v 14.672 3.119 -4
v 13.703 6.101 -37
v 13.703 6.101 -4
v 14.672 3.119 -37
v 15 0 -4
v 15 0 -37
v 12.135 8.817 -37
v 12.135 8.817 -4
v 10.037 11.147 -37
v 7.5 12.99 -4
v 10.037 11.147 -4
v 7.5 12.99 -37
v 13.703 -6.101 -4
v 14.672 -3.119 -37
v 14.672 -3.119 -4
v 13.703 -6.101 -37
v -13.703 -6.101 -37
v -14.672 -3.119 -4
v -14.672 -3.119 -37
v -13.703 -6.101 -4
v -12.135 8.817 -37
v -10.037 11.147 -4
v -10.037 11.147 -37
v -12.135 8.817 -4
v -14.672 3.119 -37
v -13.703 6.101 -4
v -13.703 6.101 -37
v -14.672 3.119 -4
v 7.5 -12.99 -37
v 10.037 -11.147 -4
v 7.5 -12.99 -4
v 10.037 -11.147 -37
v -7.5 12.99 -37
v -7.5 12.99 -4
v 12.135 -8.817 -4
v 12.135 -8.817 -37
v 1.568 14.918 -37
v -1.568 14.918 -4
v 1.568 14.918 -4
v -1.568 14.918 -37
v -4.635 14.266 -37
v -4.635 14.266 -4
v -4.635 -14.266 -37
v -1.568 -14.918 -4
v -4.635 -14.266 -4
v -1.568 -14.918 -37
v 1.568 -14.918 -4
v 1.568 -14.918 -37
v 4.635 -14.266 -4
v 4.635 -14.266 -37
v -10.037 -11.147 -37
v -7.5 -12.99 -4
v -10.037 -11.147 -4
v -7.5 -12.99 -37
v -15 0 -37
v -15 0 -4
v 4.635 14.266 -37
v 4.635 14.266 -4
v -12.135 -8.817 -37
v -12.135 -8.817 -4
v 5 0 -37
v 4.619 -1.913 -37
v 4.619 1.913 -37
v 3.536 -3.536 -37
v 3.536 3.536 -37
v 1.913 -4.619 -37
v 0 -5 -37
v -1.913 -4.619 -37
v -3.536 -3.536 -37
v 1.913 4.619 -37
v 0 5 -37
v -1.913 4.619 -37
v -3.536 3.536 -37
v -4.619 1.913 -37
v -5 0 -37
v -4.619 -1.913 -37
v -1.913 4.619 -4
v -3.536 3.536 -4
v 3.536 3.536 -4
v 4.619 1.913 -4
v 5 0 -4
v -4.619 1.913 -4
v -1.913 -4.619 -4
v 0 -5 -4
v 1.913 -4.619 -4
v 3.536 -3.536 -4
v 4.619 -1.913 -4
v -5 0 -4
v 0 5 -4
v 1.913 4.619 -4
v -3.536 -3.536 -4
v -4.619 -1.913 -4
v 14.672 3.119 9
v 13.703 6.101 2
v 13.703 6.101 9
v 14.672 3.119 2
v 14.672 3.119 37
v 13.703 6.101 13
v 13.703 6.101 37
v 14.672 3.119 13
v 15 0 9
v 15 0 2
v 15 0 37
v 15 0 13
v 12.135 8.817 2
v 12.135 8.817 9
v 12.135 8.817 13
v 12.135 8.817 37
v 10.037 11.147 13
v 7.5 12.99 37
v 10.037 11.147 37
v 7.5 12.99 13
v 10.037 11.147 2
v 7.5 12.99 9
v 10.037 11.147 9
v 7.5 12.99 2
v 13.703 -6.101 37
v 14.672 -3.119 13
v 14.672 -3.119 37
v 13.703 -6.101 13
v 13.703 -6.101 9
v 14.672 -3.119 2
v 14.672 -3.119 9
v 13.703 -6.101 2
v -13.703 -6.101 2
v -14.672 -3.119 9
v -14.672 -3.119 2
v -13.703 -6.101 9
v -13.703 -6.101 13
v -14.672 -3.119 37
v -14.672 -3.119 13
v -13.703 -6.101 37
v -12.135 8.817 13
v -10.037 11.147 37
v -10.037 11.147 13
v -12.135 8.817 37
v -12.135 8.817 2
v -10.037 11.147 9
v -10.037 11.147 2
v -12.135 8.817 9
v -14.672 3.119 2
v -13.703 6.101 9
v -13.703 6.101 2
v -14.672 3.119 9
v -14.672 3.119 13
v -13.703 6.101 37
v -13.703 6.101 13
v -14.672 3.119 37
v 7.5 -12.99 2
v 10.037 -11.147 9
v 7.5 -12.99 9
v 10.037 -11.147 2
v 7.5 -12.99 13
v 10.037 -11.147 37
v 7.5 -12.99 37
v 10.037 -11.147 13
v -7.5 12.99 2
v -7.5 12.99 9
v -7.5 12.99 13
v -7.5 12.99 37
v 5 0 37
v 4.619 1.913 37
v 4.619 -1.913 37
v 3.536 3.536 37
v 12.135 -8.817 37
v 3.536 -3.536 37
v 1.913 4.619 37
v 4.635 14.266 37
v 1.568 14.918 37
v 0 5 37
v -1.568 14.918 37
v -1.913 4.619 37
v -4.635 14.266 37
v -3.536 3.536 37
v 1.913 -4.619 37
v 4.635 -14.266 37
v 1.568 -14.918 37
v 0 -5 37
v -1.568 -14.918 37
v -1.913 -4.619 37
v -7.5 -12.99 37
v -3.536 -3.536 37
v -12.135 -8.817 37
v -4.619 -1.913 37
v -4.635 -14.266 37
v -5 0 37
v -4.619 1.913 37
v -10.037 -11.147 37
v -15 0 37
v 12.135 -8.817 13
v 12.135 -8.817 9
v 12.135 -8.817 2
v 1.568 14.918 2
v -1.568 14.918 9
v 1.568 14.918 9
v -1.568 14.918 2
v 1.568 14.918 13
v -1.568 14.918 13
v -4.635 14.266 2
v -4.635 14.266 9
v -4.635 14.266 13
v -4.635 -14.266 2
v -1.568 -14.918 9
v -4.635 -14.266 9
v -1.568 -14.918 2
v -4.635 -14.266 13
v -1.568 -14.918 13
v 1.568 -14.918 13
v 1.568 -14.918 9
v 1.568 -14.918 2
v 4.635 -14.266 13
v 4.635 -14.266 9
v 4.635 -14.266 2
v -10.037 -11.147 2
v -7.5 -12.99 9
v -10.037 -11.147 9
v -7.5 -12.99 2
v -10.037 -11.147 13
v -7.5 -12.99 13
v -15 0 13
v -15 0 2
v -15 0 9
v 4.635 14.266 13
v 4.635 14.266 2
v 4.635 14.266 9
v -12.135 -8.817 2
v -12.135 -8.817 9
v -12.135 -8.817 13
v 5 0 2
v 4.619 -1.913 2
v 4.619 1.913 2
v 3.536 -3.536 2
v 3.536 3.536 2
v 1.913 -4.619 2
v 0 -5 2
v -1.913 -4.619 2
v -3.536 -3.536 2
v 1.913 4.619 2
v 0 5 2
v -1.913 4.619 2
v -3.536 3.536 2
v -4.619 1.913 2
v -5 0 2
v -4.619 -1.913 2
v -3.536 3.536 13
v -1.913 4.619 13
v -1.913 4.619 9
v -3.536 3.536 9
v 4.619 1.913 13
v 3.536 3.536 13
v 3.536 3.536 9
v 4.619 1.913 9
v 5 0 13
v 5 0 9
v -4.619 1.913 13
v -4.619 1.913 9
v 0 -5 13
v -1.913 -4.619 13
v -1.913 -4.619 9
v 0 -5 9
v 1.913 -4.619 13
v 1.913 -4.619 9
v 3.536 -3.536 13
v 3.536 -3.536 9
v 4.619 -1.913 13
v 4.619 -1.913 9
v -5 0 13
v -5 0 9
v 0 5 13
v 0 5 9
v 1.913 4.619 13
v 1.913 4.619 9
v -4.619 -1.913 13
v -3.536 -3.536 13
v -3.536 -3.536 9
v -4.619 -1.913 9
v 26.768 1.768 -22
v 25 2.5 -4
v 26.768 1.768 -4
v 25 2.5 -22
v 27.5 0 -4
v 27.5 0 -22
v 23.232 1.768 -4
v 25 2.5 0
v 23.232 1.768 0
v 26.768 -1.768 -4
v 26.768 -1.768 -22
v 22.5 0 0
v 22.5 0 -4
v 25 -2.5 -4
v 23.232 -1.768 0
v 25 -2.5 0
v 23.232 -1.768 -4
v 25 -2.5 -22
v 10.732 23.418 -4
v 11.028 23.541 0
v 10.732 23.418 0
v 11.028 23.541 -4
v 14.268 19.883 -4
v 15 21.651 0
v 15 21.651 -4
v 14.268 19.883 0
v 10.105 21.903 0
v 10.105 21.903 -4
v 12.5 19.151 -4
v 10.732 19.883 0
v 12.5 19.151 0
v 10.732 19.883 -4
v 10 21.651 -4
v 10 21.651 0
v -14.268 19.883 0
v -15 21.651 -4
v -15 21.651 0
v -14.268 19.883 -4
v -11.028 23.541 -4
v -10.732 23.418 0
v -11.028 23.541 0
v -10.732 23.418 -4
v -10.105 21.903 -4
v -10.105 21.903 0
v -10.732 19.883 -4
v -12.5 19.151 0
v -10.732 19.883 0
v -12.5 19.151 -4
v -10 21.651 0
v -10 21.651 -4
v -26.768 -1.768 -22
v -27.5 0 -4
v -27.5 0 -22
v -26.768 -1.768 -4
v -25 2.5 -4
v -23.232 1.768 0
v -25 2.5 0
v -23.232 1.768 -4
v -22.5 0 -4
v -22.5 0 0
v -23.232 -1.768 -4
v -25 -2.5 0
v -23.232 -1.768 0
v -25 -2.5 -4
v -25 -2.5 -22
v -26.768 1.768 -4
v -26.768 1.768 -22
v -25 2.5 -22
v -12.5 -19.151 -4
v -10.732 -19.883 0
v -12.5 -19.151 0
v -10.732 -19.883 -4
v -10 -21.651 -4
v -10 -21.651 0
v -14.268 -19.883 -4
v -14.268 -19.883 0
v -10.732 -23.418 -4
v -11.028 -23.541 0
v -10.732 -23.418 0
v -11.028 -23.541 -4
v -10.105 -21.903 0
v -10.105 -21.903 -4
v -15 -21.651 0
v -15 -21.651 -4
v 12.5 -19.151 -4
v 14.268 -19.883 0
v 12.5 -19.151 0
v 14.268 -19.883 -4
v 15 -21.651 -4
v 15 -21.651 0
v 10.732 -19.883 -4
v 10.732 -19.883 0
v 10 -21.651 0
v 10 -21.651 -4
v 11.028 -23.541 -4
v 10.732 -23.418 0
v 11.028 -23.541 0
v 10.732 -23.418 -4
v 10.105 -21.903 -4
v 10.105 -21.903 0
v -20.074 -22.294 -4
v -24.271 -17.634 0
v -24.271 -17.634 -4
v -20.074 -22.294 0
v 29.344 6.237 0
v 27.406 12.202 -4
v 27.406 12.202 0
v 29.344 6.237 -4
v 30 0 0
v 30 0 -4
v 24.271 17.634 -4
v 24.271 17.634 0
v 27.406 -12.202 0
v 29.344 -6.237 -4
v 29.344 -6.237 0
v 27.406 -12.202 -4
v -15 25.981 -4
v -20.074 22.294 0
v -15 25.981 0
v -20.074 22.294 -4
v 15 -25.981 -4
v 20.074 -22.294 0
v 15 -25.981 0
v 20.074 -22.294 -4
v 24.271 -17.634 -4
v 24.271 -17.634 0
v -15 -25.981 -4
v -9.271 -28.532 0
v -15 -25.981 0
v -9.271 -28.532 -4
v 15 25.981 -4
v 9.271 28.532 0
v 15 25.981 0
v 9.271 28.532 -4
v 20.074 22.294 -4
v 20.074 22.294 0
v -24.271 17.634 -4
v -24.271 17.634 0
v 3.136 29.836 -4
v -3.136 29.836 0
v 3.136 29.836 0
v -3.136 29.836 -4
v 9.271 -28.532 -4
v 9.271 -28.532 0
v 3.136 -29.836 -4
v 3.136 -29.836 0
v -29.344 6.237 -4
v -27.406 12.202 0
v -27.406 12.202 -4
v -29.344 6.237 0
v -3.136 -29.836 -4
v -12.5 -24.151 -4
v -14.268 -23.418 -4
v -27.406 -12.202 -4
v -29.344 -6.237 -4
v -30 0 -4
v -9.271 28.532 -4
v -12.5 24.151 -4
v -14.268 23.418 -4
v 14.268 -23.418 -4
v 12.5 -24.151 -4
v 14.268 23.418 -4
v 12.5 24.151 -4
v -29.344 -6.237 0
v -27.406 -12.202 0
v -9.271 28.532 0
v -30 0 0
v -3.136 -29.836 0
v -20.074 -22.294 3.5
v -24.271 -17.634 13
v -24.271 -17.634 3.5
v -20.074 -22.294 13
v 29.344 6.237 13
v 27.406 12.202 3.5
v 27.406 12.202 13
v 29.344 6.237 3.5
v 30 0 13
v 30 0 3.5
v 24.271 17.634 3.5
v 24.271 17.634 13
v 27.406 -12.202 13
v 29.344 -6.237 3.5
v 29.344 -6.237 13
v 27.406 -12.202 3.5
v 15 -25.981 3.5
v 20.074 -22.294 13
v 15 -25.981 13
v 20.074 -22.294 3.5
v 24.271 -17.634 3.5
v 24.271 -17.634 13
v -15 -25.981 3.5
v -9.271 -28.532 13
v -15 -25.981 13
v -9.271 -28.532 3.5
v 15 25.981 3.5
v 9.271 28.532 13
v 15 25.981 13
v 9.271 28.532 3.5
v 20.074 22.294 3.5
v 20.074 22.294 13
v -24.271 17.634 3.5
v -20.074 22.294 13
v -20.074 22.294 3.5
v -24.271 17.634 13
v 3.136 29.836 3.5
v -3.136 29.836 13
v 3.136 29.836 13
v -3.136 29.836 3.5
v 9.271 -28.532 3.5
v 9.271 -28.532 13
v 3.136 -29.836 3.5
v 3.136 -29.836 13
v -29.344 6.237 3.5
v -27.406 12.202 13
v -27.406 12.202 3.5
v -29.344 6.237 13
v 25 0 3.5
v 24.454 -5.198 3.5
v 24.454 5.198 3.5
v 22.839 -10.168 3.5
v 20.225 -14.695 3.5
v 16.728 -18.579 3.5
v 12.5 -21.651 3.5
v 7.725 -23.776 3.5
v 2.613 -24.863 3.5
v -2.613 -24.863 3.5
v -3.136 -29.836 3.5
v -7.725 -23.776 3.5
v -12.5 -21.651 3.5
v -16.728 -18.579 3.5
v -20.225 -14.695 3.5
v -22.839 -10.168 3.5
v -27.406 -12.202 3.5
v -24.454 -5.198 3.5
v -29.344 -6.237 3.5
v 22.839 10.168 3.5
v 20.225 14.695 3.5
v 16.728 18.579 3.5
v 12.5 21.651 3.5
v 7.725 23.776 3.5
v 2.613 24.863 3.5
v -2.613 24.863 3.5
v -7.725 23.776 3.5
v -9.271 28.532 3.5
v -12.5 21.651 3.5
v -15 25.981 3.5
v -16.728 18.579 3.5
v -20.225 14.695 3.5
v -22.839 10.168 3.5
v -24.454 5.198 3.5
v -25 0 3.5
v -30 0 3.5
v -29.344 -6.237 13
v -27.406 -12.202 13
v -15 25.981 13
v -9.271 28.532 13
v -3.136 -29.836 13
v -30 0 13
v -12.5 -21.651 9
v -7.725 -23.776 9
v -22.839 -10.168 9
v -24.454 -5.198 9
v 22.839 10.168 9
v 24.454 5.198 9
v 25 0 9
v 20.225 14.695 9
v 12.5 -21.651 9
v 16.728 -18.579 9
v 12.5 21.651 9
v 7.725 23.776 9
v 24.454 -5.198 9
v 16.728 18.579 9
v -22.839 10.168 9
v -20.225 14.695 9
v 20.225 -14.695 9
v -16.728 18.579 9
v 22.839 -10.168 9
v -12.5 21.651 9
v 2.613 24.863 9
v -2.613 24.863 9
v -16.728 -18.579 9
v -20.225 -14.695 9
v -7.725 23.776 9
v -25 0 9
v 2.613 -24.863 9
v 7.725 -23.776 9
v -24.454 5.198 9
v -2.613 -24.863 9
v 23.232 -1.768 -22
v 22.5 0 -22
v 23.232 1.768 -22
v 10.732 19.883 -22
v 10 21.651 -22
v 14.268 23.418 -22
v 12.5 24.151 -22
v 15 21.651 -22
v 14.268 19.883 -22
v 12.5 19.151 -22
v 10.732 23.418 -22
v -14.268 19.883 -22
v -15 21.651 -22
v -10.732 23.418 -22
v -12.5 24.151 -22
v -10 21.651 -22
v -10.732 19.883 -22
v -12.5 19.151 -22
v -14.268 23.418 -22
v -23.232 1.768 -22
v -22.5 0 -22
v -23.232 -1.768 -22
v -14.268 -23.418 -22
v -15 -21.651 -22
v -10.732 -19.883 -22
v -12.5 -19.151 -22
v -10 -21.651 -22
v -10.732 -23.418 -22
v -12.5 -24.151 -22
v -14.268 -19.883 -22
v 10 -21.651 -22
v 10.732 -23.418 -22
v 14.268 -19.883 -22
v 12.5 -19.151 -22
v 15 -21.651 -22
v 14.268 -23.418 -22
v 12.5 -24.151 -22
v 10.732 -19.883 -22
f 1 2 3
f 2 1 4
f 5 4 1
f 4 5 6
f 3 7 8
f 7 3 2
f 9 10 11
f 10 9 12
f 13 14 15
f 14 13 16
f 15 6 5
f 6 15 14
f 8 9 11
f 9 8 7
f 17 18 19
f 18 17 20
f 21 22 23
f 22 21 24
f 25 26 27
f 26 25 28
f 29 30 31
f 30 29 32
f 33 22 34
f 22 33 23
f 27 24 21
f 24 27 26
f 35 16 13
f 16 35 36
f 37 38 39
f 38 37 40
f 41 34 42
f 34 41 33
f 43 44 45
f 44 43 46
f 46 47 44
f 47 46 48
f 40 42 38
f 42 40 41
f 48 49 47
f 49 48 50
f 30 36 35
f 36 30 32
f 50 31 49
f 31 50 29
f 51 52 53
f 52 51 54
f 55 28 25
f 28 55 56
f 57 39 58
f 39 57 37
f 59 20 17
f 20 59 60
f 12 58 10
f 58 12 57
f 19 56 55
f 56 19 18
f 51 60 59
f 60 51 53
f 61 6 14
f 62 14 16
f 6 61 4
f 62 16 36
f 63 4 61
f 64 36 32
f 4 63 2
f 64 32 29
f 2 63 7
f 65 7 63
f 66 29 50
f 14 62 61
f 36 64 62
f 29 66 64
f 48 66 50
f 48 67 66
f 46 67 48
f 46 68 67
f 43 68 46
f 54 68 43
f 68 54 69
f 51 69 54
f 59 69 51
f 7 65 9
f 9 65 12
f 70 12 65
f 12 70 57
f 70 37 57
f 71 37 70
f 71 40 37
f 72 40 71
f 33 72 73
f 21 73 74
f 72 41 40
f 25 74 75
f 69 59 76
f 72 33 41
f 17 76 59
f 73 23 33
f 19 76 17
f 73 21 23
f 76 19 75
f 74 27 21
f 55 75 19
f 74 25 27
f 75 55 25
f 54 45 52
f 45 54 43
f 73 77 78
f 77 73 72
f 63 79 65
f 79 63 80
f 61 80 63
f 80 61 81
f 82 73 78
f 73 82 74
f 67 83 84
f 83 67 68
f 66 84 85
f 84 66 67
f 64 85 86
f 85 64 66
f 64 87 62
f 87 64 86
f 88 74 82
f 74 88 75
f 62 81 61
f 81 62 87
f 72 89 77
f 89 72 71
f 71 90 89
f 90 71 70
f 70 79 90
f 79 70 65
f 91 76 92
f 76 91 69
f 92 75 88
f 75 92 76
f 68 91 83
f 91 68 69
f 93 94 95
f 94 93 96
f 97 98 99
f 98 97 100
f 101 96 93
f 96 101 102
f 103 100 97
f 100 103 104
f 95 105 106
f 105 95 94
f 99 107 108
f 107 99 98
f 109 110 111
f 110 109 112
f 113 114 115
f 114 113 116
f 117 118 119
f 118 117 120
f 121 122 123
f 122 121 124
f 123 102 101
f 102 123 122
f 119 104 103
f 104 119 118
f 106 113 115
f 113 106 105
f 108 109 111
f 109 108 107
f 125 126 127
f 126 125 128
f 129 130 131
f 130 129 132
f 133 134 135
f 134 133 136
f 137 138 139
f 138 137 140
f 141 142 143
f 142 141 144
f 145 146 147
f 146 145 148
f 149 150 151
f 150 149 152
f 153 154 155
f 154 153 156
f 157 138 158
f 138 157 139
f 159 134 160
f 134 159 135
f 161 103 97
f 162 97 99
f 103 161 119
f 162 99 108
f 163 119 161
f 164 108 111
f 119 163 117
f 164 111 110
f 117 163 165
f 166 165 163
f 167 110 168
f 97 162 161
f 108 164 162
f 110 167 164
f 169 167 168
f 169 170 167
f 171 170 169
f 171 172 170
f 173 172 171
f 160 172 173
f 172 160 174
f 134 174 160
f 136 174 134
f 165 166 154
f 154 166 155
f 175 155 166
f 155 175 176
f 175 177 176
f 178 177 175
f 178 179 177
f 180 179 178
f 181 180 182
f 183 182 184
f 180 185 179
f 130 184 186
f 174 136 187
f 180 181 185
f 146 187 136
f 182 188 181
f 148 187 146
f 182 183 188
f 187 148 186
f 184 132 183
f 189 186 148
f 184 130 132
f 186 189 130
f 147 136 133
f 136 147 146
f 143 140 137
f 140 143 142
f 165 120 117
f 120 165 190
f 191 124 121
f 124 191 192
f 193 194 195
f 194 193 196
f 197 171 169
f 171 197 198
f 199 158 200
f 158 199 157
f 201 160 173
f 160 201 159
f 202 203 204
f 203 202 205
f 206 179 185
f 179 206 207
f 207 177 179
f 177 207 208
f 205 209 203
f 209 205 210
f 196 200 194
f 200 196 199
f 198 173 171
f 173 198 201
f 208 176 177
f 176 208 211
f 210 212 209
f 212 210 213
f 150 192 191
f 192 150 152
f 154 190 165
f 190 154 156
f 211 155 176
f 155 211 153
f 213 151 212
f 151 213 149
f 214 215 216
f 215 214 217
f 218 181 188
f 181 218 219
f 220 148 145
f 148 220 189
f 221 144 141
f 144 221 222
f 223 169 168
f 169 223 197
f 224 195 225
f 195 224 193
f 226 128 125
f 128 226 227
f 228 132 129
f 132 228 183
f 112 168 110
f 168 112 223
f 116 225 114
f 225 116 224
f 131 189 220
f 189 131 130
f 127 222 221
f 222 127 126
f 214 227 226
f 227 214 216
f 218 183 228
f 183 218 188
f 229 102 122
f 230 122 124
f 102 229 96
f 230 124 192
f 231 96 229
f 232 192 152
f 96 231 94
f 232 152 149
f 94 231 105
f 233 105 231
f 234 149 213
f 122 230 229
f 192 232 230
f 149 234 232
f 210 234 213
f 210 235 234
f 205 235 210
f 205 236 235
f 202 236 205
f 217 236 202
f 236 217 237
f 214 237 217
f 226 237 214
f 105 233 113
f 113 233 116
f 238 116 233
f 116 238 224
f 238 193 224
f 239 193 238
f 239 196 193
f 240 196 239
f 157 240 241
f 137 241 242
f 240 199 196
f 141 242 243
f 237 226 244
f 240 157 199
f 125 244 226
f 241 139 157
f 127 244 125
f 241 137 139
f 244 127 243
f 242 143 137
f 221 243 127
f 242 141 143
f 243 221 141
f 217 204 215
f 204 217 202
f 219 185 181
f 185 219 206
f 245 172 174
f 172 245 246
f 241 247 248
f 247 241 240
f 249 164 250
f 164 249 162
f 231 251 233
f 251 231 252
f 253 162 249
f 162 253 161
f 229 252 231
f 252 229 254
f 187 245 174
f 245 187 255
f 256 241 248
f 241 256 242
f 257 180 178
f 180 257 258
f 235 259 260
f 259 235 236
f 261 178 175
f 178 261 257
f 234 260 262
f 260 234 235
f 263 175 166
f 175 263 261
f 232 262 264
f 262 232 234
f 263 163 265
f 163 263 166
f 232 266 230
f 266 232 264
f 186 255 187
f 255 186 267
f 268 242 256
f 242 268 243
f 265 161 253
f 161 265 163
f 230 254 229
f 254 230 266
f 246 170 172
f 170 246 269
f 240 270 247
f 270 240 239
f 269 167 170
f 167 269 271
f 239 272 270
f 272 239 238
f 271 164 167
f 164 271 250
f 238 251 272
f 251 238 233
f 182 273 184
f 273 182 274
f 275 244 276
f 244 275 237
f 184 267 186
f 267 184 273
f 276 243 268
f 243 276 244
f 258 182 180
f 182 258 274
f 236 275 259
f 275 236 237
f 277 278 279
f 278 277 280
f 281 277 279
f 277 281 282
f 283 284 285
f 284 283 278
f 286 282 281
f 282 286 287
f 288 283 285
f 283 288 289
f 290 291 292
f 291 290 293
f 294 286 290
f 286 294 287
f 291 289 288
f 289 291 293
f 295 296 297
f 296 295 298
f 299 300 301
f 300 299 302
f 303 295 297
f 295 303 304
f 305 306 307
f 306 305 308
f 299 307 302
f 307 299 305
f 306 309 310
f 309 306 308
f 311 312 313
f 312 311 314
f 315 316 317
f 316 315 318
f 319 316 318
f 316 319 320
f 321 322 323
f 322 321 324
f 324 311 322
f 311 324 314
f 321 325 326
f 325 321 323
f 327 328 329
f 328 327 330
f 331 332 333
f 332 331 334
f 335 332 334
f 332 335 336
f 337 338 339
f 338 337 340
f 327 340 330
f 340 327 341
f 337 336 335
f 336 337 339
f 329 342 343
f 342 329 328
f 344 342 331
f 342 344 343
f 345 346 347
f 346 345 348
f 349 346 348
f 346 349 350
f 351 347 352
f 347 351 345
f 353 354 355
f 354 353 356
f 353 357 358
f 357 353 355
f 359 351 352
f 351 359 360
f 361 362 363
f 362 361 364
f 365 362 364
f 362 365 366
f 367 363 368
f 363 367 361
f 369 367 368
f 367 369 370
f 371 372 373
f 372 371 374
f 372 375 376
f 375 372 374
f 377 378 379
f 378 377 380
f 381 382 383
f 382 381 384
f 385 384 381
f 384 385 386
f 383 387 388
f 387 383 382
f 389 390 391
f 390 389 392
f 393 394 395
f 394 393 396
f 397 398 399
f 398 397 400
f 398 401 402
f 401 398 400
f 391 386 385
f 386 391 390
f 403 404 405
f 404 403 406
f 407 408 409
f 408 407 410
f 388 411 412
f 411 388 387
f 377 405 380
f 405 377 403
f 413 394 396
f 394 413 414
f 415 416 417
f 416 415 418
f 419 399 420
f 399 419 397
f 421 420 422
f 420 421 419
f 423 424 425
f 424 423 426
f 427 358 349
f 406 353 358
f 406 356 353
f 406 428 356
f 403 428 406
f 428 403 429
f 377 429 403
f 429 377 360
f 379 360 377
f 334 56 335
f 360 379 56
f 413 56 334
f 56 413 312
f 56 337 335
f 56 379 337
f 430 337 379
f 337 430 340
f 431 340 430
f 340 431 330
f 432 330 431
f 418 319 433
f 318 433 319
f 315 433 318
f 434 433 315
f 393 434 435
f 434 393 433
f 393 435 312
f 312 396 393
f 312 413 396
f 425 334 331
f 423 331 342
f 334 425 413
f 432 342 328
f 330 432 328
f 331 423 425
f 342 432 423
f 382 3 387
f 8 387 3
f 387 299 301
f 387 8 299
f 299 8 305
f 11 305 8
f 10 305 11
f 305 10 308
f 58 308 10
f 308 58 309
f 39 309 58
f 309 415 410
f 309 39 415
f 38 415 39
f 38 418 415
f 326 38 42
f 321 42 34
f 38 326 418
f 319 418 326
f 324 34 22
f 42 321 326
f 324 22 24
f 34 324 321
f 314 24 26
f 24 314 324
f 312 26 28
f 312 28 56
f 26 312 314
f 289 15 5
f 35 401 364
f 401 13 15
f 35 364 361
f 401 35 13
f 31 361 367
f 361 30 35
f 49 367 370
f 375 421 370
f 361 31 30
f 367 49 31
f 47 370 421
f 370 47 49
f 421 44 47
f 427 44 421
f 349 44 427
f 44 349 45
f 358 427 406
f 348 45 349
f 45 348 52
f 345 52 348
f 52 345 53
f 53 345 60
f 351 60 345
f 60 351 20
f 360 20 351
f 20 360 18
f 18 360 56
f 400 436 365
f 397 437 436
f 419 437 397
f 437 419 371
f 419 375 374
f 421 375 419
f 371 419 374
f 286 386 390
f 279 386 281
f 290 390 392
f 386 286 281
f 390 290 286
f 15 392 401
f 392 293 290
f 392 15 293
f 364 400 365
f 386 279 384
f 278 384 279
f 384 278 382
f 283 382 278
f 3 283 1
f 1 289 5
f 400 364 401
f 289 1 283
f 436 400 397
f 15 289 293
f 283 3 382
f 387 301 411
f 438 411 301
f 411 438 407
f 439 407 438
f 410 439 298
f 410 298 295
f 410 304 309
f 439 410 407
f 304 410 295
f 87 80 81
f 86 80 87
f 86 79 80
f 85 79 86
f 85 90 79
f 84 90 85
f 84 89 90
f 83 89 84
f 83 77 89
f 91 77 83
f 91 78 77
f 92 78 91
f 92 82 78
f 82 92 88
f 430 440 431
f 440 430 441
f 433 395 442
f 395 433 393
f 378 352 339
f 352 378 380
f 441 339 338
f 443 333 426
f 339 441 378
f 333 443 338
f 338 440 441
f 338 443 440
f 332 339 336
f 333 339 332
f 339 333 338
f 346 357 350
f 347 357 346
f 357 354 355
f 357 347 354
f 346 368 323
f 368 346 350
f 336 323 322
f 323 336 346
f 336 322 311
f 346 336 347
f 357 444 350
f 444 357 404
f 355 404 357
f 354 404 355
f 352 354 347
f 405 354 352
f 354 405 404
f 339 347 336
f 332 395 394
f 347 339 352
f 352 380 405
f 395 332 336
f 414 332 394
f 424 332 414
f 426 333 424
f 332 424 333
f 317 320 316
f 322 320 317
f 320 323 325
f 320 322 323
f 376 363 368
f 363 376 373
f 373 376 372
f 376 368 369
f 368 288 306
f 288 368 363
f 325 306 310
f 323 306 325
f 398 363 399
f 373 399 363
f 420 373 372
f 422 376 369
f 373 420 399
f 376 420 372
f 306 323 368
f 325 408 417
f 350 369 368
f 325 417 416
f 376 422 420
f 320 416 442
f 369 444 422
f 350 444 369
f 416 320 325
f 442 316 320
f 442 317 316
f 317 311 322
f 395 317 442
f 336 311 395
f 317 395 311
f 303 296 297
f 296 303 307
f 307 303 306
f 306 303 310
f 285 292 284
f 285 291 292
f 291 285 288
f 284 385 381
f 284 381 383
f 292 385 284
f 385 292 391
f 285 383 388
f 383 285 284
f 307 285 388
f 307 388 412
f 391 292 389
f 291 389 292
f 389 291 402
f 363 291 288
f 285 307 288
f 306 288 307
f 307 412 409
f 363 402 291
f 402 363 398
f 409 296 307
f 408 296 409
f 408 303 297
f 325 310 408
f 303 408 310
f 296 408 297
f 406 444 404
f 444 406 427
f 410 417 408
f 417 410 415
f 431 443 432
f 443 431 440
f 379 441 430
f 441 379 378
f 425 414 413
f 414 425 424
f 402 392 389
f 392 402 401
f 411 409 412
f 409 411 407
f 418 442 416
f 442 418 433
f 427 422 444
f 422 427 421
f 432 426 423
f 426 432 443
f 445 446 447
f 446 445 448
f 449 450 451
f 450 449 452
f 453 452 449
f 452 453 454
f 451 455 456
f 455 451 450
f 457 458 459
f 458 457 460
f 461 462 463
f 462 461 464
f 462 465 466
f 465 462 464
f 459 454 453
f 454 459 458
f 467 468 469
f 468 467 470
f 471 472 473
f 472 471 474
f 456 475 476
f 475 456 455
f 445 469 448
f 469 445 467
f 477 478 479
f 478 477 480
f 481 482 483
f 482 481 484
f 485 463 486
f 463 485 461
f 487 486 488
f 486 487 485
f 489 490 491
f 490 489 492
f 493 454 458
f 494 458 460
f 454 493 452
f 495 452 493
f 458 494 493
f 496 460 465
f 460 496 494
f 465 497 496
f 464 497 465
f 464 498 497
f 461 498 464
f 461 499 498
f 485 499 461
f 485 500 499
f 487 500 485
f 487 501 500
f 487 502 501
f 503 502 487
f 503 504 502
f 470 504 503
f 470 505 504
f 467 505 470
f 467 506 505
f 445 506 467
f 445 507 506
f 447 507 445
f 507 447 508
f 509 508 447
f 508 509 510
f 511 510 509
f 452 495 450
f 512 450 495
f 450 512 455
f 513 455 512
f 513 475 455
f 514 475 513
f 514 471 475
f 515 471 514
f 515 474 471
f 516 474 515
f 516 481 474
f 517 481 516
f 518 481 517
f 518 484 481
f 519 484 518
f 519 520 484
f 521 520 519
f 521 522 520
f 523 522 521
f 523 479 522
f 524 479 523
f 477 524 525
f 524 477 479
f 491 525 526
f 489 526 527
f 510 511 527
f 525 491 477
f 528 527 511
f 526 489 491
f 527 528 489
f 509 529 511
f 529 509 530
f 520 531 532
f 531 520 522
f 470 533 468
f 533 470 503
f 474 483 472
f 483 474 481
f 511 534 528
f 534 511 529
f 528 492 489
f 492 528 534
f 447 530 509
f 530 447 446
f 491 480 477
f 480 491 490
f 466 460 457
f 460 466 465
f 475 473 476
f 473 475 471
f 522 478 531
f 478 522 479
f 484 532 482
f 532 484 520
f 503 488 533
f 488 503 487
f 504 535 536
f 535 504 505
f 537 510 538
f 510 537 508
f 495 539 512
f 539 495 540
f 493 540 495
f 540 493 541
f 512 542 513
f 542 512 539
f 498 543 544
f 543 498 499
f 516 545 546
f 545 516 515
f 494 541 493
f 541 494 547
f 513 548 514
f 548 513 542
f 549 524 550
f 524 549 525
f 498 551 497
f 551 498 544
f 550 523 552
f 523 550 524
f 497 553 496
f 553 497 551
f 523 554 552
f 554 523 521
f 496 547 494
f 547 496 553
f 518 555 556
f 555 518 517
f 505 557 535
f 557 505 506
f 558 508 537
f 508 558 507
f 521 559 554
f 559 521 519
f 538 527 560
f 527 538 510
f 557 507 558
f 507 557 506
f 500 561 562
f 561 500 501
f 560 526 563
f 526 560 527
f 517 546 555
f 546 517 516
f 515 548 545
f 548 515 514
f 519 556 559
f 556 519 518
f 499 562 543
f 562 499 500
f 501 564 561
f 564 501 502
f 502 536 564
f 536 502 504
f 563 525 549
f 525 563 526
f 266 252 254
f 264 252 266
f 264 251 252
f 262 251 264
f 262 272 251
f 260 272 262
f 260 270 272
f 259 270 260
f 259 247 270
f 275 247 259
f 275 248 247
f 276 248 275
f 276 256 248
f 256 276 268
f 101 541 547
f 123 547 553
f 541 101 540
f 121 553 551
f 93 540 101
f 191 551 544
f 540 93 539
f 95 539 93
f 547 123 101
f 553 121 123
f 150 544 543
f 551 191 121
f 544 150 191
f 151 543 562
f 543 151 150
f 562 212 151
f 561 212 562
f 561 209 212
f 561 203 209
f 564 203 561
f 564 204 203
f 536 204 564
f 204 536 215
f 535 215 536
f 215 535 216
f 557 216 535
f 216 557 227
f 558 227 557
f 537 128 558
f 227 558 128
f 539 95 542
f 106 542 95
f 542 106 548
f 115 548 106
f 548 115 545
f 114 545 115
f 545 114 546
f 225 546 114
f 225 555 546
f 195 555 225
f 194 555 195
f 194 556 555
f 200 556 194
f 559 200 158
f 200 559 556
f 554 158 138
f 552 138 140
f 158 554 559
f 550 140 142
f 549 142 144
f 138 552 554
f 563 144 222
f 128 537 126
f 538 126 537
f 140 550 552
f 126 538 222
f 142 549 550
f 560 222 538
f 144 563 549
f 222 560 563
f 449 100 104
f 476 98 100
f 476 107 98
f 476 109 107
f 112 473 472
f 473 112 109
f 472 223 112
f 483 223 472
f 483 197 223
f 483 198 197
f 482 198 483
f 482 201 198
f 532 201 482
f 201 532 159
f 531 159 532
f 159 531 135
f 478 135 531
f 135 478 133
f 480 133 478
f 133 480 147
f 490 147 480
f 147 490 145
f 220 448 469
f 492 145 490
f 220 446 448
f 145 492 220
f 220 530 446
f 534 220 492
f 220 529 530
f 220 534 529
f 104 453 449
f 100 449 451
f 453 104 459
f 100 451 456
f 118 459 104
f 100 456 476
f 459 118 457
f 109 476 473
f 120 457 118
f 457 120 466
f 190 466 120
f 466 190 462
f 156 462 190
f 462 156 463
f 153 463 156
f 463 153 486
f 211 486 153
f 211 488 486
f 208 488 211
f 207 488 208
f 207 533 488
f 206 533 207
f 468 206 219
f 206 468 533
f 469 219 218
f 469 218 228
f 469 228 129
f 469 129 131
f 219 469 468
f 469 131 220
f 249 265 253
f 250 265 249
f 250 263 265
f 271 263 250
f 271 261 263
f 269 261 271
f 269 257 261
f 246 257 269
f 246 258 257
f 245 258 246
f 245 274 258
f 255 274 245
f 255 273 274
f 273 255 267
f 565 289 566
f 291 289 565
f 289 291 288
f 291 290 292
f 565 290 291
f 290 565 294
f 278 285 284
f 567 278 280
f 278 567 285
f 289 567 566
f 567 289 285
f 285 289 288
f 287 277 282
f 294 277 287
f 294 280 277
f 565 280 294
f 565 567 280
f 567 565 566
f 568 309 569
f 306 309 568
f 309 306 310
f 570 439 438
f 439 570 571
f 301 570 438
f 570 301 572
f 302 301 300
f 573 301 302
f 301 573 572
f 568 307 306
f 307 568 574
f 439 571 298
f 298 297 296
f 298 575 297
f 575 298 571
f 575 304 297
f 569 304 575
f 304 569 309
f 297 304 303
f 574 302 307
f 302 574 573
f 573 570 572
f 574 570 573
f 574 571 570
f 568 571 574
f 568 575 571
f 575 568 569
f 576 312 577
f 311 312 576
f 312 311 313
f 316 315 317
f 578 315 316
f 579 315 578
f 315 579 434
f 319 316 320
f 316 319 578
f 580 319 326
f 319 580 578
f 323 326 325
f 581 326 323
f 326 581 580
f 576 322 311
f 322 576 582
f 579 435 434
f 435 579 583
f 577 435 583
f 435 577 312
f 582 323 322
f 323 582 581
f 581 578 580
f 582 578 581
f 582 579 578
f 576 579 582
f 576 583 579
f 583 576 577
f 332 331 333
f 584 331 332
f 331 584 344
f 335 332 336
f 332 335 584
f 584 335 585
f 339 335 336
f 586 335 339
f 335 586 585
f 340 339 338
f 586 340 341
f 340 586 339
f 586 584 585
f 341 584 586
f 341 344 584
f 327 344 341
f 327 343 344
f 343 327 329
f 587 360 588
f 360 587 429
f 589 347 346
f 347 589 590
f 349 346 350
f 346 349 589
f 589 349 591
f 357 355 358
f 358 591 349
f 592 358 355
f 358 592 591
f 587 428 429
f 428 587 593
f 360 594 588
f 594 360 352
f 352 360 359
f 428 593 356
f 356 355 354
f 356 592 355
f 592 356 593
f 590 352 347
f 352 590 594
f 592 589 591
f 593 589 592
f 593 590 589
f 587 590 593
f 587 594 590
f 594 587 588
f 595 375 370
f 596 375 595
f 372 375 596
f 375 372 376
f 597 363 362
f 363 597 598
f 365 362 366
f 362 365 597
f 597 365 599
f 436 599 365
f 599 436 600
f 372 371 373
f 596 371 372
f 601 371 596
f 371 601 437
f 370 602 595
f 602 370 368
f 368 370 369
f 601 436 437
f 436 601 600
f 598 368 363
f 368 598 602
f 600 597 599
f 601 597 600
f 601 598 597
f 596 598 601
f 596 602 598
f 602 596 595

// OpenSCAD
// Parameters
hub_diameter = 30;
hub_length = 35; // Reduced to match the original model
shaft_hole_diameter = 10;
flange_diameter = 60;
flange_thickness = 4; // Reduced to make it more distinct
bolt_hole_diameter = 5;
bolt_circle_diameter = 50;
spacer_thickness = 3; // Adjusted to make it more visible
bolt_length = 22; // Increased slightly to ensure bolts are distinct
bolt_diameter = 5;
nut_size = 8;
nut_thickness = 4;

// Function to create a hub
module hub() {
    difference() {
        cylinder(d=hub_diameter, h=hub_length, center=true);
        cylinder(d=shaft_hole_diameter, h=hub_length + 2, center=true);
    }
}

// Function to create a flange plate
module flange_plate() {
    difference() {
        cylinder(d=flange_diameter, h=flange_thickness, center=true);
        for (i = [0:5]) {
            angle = i * 60;
            translate([bolt_circle_diameter/2 * cos(angle), bolt_circle_diameter/2 * sin(angle), 0])
                cylinder(d=bolt_hole_diameter, h=flange_thickness + 2, center=true);
        }
    }
}

// Function to create a spacer ring
module spacer_ring() {
    difference() {
        cylinder(d=flange_diameter, h=spacer_thickness, center=true);
        cylinder(d=bolt_circle_diameter, h=spacer_thickness + 2, center=true);
    }
}

// Function to create a bolt
module bolt() {
    translate([0, 0, -bolt_length/2])
        cylinder(d=bolt_diameter, h=bolt_length, center=true);
}

// Function to create a nut
module nut() {
    translate([0, 0, bolt_length/2])
        cylinder(d=nut_size, h=nut_thickness, center=true, $fn=6);
}

// Assembly
module coupling() {
    translate([0, 0, -hub_length/2 - flange_thickness/2])
        hub();
    
    translate([0, 0, hub_length/2 + flange_thickness/2])
        hub();
    
    translate([0, 0, -flange_thickness/2])
        flange_plate();
    
    translate([0, 0, flange_thickness/2 + spacer_thickness])
        spacer_ring();
    
    translate([0, 0, flange_thickness/2 + 2 * spacer_thickness])
        spacer_ring();
    
    translate([0, 0, flange_thickness/2 + 3 * spacer_thickness])
        flange_plate();
    
    for (i = [0:5]) {
        angle = i * 60;
        translate([bolt_circle_diameter/2 * cos(angle), bolt_circle_diameter/2 * sin(angle), 0]) {
            bolt();
            nut();
        }
    }
}

// Render the coupling
coupling();
